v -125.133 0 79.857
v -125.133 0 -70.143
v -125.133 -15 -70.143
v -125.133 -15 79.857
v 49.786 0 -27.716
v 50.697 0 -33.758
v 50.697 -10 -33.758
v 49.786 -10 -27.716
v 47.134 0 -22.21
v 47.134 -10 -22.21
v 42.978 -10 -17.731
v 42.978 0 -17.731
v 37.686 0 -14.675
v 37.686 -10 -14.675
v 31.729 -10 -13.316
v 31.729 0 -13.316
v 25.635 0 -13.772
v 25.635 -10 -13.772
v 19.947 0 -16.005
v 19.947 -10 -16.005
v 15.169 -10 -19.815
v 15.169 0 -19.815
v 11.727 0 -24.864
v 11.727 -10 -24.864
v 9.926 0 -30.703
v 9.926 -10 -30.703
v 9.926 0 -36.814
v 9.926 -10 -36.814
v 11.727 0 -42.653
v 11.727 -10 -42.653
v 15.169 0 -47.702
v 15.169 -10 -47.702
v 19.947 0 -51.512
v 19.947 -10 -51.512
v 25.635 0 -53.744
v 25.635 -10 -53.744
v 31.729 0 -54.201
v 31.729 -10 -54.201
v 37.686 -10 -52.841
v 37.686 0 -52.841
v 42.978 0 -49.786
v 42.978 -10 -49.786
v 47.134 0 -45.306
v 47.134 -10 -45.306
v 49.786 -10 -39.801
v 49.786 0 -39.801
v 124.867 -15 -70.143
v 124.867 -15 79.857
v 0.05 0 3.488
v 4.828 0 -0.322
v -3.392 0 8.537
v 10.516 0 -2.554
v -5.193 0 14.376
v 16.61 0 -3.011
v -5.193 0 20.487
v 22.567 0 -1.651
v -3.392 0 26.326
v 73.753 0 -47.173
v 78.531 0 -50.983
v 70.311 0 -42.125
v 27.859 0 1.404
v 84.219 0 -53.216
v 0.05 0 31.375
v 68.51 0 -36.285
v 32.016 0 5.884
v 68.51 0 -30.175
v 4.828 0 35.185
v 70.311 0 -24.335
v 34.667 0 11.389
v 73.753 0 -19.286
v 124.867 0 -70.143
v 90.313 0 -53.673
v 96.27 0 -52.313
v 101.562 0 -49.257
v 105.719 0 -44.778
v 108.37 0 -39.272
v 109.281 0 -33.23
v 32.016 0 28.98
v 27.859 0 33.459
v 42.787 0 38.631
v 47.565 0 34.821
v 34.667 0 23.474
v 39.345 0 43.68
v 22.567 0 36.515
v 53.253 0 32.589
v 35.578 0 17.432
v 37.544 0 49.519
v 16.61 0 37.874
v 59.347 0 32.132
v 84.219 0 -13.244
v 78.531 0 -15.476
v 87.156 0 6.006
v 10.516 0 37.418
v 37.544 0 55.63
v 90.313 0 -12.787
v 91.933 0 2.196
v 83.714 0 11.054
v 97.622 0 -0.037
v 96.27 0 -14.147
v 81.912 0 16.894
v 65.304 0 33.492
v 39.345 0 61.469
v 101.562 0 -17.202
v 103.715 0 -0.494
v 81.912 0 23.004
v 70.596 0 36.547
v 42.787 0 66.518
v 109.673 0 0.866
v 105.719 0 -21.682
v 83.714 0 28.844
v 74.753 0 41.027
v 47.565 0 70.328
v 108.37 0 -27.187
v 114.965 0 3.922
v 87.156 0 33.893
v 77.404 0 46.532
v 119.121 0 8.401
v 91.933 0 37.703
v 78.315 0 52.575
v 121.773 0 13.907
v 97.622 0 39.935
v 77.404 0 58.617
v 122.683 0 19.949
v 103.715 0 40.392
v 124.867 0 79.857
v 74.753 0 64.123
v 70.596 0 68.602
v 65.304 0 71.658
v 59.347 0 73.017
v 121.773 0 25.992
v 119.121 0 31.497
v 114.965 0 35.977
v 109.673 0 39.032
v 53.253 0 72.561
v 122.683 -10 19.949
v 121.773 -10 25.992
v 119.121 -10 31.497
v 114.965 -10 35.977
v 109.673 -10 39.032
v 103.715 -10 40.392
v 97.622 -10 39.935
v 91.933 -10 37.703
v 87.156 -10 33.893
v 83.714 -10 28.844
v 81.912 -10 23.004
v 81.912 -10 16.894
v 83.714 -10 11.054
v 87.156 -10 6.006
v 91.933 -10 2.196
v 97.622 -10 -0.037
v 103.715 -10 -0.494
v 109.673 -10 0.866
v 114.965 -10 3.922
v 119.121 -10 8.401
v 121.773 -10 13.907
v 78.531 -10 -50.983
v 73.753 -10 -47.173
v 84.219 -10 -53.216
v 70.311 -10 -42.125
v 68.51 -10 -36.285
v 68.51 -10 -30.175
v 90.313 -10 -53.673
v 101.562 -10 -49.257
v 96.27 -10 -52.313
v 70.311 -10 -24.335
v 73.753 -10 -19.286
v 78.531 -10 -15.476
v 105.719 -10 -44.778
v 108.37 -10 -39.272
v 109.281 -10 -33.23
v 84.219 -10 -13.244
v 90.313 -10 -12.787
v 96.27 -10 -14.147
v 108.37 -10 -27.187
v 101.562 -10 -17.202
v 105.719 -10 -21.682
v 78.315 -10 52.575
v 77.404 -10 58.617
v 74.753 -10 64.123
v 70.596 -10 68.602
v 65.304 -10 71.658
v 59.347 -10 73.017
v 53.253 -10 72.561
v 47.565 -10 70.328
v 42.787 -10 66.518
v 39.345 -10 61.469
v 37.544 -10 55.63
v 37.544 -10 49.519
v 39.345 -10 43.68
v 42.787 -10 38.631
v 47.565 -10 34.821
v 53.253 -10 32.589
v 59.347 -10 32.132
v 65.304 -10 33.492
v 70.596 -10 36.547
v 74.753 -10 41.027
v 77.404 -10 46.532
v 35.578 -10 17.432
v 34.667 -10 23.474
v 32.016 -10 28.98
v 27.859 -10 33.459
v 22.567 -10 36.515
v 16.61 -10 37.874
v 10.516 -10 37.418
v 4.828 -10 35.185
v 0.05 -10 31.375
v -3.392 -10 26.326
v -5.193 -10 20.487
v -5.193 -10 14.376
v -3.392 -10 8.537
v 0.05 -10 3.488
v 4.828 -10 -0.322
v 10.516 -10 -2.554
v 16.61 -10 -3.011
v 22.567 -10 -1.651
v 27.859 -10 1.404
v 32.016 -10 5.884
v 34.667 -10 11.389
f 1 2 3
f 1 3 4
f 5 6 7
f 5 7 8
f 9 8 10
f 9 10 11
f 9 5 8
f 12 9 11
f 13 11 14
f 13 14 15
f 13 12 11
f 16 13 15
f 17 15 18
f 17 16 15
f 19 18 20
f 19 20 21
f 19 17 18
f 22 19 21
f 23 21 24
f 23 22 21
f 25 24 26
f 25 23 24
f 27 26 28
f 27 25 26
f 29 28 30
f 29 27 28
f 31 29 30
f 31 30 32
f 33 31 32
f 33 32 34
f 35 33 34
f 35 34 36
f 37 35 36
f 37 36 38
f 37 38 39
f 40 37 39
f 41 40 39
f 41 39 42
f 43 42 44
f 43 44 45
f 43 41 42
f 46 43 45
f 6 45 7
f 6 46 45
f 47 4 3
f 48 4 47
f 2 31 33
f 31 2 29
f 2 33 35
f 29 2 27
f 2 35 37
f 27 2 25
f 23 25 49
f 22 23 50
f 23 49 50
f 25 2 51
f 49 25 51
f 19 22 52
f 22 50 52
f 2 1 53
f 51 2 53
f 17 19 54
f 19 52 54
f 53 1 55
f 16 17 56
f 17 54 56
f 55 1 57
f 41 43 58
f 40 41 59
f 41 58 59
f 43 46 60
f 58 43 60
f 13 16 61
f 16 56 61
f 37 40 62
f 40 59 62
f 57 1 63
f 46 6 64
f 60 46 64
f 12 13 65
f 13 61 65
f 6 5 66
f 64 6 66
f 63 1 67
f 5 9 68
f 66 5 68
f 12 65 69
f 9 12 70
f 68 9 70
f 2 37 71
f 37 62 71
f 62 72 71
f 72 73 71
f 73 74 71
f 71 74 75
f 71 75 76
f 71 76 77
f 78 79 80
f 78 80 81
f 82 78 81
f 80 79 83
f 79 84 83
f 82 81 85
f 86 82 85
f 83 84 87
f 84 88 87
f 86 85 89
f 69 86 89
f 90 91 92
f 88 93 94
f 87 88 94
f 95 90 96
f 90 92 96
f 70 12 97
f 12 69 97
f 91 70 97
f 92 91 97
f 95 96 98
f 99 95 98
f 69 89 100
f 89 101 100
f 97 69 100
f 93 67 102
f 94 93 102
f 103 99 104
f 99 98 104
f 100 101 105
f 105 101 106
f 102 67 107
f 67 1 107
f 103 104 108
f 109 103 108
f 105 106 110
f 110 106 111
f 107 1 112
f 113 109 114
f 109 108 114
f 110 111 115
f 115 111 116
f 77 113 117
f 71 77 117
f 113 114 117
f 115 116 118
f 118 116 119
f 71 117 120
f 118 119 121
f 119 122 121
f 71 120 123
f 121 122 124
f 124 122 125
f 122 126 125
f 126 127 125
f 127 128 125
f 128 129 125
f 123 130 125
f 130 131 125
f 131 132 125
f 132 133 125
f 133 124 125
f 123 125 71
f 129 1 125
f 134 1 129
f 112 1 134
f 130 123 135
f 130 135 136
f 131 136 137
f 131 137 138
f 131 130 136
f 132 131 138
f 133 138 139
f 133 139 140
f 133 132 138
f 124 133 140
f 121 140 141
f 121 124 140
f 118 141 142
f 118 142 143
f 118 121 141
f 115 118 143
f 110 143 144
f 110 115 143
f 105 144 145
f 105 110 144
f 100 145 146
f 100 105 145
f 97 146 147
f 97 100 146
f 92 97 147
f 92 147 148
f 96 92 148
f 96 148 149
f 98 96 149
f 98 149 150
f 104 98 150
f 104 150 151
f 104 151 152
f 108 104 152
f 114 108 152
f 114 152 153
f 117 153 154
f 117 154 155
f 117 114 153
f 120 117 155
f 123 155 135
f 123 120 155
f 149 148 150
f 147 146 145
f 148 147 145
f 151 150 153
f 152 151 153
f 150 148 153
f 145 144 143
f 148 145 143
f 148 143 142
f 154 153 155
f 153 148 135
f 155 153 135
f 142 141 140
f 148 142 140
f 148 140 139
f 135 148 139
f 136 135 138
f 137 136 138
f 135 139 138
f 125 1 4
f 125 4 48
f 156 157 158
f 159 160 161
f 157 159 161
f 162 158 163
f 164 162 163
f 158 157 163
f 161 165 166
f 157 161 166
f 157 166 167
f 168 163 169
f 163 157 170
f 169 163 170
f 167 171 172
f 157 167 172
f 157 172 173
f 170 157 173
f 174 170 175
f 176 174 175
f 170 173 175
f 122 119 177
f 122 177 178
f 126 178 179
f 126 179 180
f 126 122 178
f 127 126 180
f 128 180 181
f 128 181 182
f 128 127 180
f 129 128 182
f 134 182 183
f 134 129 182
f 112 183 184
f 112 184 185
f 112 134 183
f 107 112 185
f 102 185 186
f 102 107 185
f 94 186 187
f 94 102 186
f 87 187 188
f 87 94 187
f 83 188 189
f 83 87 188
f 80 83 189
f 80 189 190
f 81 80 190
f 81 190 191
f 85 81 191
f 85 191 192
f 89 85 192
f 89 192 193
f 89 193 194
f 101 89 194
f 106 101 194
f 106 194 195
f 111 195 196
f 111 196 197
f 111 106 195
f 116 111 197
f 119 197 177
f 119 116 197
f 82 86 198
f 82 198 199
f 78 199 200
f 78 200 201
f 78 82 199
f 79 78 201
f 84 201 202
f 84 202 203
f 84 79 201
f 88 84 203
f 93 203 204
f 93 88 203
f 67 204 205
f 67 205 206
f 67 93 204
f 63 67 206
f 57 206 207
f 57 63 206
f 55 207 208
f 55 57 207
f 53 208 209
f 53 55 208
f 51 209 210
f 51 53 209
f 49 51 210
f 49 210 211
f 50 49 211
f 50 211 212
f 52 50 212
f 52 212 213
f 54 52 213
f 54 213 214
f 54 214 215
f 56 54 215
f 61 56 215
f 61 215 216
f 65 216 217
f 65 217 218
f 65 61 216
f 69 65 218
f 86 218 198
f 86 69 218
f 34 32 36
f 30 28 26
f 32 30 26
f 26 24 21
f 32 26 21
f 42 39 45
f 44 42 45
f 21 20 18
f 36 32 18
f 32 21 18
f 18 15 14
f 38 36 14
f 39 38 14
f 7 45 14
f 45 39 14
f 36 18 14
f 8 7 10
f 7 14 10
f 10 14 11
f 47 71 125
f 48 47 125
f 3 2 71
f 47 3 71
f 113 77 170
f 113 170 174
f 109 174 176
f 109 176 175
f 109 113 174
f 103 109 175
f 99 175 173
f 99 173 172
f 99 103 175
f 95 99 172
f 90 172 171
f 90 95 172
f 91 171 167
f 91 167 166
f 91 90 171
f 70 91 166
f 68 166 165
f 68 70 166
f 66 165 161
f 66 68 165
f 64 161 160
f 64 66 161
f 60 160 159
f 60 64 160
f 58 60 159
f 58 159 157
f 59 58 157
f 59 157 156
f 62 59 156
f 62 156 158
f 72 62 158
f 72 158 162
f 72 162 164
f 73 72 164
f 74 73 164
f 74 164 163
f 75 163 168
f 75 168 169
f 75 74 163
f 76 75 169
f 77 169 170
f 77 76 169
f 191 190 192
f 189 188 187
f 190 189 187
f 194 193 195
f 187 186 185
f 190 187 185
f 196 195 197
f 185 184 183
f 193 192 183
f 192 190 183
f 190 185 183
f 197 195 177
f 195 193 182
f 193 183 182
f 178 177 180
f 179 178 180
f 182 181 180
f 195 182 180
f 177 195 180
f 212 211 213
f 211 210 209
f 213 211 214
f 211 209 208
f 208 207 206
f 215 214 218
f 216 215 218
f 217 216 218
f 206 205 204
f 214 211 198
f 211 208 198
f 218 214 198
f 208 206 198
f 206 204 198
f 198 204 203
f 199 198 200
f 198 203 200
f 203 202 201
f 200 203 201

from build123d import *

# Parameters (mm, degrees)
F0_W     = 250
F0_H     = 150
F2_DEPTH = 15
F1_R     = 20.5
F3_DEPTH = 10
F4_DEPTH = 10
F5_DEPTH = 10
F6_DEPTH = 10
F7_DEPTH = 10
F8_DEPTH = 10


with BuildPart() as f2:
    # F0 (on Front) → F2 (new body)
    with BuildSketch(Plane.XZ):
        with Locations((-0.132803, 4.857429)):
            Rectangle(F0_W, F0_H)
    extrude(amount=F2_DEPTH)

    # F1 (on face) → F3 (cut)
    with BuildSketch(Plane.XZ):
        with Locations((57.814665, 52.574778)):
            Circle(F1_R)
    extrude(amount=F3_DEPTH, mode=Mode.SUBTRACT)

    # F1 (on face) → F4 (cut)
    with BuildSketch(Plane.XZ):
        with Locations((102.183415, 19.949049)):
            Circle(F1_R)
    extrude(amount=F4_DEPTH, mode=Mode.SUBTRACT)

    # F1 (on face) → F5 (cut)
    with BuildSketch(Plane.XZ):
        with Locations((102.183415, 19.949049)):
            Circle(F1_R)
    extrude(amount=-F5_DEPTH, mode=Mode.SUBTRACT)

    # F1 (on face) → F6 (cut)
    with BuildSketch(Plane.XZ):
        with Locations((88.780629, -33.229924)):
            Circle(F1_R)
    extrude(amount=F6_DEPTH, mode=Mode.SUBTRACT)

    # F1 (on face) → F7 (cut)
    with BuildSketch(Plane.XZ):
        with Locations((30.196567, -33.758188)):
            Circle(F1_R)
    extrude(amount=F7_DEPTH, mode=Mode.SUBTRACT)

    # F1 (on face) → F8 (cut)
    with BuildSketch(Plane.XZ):
        with Locations((15.077671, 17.431745)):
            Circle(F1_R)
    extrude(amount=F8_DEPTH, mode=Mode.SUBTRACT)


solid = f2.part
